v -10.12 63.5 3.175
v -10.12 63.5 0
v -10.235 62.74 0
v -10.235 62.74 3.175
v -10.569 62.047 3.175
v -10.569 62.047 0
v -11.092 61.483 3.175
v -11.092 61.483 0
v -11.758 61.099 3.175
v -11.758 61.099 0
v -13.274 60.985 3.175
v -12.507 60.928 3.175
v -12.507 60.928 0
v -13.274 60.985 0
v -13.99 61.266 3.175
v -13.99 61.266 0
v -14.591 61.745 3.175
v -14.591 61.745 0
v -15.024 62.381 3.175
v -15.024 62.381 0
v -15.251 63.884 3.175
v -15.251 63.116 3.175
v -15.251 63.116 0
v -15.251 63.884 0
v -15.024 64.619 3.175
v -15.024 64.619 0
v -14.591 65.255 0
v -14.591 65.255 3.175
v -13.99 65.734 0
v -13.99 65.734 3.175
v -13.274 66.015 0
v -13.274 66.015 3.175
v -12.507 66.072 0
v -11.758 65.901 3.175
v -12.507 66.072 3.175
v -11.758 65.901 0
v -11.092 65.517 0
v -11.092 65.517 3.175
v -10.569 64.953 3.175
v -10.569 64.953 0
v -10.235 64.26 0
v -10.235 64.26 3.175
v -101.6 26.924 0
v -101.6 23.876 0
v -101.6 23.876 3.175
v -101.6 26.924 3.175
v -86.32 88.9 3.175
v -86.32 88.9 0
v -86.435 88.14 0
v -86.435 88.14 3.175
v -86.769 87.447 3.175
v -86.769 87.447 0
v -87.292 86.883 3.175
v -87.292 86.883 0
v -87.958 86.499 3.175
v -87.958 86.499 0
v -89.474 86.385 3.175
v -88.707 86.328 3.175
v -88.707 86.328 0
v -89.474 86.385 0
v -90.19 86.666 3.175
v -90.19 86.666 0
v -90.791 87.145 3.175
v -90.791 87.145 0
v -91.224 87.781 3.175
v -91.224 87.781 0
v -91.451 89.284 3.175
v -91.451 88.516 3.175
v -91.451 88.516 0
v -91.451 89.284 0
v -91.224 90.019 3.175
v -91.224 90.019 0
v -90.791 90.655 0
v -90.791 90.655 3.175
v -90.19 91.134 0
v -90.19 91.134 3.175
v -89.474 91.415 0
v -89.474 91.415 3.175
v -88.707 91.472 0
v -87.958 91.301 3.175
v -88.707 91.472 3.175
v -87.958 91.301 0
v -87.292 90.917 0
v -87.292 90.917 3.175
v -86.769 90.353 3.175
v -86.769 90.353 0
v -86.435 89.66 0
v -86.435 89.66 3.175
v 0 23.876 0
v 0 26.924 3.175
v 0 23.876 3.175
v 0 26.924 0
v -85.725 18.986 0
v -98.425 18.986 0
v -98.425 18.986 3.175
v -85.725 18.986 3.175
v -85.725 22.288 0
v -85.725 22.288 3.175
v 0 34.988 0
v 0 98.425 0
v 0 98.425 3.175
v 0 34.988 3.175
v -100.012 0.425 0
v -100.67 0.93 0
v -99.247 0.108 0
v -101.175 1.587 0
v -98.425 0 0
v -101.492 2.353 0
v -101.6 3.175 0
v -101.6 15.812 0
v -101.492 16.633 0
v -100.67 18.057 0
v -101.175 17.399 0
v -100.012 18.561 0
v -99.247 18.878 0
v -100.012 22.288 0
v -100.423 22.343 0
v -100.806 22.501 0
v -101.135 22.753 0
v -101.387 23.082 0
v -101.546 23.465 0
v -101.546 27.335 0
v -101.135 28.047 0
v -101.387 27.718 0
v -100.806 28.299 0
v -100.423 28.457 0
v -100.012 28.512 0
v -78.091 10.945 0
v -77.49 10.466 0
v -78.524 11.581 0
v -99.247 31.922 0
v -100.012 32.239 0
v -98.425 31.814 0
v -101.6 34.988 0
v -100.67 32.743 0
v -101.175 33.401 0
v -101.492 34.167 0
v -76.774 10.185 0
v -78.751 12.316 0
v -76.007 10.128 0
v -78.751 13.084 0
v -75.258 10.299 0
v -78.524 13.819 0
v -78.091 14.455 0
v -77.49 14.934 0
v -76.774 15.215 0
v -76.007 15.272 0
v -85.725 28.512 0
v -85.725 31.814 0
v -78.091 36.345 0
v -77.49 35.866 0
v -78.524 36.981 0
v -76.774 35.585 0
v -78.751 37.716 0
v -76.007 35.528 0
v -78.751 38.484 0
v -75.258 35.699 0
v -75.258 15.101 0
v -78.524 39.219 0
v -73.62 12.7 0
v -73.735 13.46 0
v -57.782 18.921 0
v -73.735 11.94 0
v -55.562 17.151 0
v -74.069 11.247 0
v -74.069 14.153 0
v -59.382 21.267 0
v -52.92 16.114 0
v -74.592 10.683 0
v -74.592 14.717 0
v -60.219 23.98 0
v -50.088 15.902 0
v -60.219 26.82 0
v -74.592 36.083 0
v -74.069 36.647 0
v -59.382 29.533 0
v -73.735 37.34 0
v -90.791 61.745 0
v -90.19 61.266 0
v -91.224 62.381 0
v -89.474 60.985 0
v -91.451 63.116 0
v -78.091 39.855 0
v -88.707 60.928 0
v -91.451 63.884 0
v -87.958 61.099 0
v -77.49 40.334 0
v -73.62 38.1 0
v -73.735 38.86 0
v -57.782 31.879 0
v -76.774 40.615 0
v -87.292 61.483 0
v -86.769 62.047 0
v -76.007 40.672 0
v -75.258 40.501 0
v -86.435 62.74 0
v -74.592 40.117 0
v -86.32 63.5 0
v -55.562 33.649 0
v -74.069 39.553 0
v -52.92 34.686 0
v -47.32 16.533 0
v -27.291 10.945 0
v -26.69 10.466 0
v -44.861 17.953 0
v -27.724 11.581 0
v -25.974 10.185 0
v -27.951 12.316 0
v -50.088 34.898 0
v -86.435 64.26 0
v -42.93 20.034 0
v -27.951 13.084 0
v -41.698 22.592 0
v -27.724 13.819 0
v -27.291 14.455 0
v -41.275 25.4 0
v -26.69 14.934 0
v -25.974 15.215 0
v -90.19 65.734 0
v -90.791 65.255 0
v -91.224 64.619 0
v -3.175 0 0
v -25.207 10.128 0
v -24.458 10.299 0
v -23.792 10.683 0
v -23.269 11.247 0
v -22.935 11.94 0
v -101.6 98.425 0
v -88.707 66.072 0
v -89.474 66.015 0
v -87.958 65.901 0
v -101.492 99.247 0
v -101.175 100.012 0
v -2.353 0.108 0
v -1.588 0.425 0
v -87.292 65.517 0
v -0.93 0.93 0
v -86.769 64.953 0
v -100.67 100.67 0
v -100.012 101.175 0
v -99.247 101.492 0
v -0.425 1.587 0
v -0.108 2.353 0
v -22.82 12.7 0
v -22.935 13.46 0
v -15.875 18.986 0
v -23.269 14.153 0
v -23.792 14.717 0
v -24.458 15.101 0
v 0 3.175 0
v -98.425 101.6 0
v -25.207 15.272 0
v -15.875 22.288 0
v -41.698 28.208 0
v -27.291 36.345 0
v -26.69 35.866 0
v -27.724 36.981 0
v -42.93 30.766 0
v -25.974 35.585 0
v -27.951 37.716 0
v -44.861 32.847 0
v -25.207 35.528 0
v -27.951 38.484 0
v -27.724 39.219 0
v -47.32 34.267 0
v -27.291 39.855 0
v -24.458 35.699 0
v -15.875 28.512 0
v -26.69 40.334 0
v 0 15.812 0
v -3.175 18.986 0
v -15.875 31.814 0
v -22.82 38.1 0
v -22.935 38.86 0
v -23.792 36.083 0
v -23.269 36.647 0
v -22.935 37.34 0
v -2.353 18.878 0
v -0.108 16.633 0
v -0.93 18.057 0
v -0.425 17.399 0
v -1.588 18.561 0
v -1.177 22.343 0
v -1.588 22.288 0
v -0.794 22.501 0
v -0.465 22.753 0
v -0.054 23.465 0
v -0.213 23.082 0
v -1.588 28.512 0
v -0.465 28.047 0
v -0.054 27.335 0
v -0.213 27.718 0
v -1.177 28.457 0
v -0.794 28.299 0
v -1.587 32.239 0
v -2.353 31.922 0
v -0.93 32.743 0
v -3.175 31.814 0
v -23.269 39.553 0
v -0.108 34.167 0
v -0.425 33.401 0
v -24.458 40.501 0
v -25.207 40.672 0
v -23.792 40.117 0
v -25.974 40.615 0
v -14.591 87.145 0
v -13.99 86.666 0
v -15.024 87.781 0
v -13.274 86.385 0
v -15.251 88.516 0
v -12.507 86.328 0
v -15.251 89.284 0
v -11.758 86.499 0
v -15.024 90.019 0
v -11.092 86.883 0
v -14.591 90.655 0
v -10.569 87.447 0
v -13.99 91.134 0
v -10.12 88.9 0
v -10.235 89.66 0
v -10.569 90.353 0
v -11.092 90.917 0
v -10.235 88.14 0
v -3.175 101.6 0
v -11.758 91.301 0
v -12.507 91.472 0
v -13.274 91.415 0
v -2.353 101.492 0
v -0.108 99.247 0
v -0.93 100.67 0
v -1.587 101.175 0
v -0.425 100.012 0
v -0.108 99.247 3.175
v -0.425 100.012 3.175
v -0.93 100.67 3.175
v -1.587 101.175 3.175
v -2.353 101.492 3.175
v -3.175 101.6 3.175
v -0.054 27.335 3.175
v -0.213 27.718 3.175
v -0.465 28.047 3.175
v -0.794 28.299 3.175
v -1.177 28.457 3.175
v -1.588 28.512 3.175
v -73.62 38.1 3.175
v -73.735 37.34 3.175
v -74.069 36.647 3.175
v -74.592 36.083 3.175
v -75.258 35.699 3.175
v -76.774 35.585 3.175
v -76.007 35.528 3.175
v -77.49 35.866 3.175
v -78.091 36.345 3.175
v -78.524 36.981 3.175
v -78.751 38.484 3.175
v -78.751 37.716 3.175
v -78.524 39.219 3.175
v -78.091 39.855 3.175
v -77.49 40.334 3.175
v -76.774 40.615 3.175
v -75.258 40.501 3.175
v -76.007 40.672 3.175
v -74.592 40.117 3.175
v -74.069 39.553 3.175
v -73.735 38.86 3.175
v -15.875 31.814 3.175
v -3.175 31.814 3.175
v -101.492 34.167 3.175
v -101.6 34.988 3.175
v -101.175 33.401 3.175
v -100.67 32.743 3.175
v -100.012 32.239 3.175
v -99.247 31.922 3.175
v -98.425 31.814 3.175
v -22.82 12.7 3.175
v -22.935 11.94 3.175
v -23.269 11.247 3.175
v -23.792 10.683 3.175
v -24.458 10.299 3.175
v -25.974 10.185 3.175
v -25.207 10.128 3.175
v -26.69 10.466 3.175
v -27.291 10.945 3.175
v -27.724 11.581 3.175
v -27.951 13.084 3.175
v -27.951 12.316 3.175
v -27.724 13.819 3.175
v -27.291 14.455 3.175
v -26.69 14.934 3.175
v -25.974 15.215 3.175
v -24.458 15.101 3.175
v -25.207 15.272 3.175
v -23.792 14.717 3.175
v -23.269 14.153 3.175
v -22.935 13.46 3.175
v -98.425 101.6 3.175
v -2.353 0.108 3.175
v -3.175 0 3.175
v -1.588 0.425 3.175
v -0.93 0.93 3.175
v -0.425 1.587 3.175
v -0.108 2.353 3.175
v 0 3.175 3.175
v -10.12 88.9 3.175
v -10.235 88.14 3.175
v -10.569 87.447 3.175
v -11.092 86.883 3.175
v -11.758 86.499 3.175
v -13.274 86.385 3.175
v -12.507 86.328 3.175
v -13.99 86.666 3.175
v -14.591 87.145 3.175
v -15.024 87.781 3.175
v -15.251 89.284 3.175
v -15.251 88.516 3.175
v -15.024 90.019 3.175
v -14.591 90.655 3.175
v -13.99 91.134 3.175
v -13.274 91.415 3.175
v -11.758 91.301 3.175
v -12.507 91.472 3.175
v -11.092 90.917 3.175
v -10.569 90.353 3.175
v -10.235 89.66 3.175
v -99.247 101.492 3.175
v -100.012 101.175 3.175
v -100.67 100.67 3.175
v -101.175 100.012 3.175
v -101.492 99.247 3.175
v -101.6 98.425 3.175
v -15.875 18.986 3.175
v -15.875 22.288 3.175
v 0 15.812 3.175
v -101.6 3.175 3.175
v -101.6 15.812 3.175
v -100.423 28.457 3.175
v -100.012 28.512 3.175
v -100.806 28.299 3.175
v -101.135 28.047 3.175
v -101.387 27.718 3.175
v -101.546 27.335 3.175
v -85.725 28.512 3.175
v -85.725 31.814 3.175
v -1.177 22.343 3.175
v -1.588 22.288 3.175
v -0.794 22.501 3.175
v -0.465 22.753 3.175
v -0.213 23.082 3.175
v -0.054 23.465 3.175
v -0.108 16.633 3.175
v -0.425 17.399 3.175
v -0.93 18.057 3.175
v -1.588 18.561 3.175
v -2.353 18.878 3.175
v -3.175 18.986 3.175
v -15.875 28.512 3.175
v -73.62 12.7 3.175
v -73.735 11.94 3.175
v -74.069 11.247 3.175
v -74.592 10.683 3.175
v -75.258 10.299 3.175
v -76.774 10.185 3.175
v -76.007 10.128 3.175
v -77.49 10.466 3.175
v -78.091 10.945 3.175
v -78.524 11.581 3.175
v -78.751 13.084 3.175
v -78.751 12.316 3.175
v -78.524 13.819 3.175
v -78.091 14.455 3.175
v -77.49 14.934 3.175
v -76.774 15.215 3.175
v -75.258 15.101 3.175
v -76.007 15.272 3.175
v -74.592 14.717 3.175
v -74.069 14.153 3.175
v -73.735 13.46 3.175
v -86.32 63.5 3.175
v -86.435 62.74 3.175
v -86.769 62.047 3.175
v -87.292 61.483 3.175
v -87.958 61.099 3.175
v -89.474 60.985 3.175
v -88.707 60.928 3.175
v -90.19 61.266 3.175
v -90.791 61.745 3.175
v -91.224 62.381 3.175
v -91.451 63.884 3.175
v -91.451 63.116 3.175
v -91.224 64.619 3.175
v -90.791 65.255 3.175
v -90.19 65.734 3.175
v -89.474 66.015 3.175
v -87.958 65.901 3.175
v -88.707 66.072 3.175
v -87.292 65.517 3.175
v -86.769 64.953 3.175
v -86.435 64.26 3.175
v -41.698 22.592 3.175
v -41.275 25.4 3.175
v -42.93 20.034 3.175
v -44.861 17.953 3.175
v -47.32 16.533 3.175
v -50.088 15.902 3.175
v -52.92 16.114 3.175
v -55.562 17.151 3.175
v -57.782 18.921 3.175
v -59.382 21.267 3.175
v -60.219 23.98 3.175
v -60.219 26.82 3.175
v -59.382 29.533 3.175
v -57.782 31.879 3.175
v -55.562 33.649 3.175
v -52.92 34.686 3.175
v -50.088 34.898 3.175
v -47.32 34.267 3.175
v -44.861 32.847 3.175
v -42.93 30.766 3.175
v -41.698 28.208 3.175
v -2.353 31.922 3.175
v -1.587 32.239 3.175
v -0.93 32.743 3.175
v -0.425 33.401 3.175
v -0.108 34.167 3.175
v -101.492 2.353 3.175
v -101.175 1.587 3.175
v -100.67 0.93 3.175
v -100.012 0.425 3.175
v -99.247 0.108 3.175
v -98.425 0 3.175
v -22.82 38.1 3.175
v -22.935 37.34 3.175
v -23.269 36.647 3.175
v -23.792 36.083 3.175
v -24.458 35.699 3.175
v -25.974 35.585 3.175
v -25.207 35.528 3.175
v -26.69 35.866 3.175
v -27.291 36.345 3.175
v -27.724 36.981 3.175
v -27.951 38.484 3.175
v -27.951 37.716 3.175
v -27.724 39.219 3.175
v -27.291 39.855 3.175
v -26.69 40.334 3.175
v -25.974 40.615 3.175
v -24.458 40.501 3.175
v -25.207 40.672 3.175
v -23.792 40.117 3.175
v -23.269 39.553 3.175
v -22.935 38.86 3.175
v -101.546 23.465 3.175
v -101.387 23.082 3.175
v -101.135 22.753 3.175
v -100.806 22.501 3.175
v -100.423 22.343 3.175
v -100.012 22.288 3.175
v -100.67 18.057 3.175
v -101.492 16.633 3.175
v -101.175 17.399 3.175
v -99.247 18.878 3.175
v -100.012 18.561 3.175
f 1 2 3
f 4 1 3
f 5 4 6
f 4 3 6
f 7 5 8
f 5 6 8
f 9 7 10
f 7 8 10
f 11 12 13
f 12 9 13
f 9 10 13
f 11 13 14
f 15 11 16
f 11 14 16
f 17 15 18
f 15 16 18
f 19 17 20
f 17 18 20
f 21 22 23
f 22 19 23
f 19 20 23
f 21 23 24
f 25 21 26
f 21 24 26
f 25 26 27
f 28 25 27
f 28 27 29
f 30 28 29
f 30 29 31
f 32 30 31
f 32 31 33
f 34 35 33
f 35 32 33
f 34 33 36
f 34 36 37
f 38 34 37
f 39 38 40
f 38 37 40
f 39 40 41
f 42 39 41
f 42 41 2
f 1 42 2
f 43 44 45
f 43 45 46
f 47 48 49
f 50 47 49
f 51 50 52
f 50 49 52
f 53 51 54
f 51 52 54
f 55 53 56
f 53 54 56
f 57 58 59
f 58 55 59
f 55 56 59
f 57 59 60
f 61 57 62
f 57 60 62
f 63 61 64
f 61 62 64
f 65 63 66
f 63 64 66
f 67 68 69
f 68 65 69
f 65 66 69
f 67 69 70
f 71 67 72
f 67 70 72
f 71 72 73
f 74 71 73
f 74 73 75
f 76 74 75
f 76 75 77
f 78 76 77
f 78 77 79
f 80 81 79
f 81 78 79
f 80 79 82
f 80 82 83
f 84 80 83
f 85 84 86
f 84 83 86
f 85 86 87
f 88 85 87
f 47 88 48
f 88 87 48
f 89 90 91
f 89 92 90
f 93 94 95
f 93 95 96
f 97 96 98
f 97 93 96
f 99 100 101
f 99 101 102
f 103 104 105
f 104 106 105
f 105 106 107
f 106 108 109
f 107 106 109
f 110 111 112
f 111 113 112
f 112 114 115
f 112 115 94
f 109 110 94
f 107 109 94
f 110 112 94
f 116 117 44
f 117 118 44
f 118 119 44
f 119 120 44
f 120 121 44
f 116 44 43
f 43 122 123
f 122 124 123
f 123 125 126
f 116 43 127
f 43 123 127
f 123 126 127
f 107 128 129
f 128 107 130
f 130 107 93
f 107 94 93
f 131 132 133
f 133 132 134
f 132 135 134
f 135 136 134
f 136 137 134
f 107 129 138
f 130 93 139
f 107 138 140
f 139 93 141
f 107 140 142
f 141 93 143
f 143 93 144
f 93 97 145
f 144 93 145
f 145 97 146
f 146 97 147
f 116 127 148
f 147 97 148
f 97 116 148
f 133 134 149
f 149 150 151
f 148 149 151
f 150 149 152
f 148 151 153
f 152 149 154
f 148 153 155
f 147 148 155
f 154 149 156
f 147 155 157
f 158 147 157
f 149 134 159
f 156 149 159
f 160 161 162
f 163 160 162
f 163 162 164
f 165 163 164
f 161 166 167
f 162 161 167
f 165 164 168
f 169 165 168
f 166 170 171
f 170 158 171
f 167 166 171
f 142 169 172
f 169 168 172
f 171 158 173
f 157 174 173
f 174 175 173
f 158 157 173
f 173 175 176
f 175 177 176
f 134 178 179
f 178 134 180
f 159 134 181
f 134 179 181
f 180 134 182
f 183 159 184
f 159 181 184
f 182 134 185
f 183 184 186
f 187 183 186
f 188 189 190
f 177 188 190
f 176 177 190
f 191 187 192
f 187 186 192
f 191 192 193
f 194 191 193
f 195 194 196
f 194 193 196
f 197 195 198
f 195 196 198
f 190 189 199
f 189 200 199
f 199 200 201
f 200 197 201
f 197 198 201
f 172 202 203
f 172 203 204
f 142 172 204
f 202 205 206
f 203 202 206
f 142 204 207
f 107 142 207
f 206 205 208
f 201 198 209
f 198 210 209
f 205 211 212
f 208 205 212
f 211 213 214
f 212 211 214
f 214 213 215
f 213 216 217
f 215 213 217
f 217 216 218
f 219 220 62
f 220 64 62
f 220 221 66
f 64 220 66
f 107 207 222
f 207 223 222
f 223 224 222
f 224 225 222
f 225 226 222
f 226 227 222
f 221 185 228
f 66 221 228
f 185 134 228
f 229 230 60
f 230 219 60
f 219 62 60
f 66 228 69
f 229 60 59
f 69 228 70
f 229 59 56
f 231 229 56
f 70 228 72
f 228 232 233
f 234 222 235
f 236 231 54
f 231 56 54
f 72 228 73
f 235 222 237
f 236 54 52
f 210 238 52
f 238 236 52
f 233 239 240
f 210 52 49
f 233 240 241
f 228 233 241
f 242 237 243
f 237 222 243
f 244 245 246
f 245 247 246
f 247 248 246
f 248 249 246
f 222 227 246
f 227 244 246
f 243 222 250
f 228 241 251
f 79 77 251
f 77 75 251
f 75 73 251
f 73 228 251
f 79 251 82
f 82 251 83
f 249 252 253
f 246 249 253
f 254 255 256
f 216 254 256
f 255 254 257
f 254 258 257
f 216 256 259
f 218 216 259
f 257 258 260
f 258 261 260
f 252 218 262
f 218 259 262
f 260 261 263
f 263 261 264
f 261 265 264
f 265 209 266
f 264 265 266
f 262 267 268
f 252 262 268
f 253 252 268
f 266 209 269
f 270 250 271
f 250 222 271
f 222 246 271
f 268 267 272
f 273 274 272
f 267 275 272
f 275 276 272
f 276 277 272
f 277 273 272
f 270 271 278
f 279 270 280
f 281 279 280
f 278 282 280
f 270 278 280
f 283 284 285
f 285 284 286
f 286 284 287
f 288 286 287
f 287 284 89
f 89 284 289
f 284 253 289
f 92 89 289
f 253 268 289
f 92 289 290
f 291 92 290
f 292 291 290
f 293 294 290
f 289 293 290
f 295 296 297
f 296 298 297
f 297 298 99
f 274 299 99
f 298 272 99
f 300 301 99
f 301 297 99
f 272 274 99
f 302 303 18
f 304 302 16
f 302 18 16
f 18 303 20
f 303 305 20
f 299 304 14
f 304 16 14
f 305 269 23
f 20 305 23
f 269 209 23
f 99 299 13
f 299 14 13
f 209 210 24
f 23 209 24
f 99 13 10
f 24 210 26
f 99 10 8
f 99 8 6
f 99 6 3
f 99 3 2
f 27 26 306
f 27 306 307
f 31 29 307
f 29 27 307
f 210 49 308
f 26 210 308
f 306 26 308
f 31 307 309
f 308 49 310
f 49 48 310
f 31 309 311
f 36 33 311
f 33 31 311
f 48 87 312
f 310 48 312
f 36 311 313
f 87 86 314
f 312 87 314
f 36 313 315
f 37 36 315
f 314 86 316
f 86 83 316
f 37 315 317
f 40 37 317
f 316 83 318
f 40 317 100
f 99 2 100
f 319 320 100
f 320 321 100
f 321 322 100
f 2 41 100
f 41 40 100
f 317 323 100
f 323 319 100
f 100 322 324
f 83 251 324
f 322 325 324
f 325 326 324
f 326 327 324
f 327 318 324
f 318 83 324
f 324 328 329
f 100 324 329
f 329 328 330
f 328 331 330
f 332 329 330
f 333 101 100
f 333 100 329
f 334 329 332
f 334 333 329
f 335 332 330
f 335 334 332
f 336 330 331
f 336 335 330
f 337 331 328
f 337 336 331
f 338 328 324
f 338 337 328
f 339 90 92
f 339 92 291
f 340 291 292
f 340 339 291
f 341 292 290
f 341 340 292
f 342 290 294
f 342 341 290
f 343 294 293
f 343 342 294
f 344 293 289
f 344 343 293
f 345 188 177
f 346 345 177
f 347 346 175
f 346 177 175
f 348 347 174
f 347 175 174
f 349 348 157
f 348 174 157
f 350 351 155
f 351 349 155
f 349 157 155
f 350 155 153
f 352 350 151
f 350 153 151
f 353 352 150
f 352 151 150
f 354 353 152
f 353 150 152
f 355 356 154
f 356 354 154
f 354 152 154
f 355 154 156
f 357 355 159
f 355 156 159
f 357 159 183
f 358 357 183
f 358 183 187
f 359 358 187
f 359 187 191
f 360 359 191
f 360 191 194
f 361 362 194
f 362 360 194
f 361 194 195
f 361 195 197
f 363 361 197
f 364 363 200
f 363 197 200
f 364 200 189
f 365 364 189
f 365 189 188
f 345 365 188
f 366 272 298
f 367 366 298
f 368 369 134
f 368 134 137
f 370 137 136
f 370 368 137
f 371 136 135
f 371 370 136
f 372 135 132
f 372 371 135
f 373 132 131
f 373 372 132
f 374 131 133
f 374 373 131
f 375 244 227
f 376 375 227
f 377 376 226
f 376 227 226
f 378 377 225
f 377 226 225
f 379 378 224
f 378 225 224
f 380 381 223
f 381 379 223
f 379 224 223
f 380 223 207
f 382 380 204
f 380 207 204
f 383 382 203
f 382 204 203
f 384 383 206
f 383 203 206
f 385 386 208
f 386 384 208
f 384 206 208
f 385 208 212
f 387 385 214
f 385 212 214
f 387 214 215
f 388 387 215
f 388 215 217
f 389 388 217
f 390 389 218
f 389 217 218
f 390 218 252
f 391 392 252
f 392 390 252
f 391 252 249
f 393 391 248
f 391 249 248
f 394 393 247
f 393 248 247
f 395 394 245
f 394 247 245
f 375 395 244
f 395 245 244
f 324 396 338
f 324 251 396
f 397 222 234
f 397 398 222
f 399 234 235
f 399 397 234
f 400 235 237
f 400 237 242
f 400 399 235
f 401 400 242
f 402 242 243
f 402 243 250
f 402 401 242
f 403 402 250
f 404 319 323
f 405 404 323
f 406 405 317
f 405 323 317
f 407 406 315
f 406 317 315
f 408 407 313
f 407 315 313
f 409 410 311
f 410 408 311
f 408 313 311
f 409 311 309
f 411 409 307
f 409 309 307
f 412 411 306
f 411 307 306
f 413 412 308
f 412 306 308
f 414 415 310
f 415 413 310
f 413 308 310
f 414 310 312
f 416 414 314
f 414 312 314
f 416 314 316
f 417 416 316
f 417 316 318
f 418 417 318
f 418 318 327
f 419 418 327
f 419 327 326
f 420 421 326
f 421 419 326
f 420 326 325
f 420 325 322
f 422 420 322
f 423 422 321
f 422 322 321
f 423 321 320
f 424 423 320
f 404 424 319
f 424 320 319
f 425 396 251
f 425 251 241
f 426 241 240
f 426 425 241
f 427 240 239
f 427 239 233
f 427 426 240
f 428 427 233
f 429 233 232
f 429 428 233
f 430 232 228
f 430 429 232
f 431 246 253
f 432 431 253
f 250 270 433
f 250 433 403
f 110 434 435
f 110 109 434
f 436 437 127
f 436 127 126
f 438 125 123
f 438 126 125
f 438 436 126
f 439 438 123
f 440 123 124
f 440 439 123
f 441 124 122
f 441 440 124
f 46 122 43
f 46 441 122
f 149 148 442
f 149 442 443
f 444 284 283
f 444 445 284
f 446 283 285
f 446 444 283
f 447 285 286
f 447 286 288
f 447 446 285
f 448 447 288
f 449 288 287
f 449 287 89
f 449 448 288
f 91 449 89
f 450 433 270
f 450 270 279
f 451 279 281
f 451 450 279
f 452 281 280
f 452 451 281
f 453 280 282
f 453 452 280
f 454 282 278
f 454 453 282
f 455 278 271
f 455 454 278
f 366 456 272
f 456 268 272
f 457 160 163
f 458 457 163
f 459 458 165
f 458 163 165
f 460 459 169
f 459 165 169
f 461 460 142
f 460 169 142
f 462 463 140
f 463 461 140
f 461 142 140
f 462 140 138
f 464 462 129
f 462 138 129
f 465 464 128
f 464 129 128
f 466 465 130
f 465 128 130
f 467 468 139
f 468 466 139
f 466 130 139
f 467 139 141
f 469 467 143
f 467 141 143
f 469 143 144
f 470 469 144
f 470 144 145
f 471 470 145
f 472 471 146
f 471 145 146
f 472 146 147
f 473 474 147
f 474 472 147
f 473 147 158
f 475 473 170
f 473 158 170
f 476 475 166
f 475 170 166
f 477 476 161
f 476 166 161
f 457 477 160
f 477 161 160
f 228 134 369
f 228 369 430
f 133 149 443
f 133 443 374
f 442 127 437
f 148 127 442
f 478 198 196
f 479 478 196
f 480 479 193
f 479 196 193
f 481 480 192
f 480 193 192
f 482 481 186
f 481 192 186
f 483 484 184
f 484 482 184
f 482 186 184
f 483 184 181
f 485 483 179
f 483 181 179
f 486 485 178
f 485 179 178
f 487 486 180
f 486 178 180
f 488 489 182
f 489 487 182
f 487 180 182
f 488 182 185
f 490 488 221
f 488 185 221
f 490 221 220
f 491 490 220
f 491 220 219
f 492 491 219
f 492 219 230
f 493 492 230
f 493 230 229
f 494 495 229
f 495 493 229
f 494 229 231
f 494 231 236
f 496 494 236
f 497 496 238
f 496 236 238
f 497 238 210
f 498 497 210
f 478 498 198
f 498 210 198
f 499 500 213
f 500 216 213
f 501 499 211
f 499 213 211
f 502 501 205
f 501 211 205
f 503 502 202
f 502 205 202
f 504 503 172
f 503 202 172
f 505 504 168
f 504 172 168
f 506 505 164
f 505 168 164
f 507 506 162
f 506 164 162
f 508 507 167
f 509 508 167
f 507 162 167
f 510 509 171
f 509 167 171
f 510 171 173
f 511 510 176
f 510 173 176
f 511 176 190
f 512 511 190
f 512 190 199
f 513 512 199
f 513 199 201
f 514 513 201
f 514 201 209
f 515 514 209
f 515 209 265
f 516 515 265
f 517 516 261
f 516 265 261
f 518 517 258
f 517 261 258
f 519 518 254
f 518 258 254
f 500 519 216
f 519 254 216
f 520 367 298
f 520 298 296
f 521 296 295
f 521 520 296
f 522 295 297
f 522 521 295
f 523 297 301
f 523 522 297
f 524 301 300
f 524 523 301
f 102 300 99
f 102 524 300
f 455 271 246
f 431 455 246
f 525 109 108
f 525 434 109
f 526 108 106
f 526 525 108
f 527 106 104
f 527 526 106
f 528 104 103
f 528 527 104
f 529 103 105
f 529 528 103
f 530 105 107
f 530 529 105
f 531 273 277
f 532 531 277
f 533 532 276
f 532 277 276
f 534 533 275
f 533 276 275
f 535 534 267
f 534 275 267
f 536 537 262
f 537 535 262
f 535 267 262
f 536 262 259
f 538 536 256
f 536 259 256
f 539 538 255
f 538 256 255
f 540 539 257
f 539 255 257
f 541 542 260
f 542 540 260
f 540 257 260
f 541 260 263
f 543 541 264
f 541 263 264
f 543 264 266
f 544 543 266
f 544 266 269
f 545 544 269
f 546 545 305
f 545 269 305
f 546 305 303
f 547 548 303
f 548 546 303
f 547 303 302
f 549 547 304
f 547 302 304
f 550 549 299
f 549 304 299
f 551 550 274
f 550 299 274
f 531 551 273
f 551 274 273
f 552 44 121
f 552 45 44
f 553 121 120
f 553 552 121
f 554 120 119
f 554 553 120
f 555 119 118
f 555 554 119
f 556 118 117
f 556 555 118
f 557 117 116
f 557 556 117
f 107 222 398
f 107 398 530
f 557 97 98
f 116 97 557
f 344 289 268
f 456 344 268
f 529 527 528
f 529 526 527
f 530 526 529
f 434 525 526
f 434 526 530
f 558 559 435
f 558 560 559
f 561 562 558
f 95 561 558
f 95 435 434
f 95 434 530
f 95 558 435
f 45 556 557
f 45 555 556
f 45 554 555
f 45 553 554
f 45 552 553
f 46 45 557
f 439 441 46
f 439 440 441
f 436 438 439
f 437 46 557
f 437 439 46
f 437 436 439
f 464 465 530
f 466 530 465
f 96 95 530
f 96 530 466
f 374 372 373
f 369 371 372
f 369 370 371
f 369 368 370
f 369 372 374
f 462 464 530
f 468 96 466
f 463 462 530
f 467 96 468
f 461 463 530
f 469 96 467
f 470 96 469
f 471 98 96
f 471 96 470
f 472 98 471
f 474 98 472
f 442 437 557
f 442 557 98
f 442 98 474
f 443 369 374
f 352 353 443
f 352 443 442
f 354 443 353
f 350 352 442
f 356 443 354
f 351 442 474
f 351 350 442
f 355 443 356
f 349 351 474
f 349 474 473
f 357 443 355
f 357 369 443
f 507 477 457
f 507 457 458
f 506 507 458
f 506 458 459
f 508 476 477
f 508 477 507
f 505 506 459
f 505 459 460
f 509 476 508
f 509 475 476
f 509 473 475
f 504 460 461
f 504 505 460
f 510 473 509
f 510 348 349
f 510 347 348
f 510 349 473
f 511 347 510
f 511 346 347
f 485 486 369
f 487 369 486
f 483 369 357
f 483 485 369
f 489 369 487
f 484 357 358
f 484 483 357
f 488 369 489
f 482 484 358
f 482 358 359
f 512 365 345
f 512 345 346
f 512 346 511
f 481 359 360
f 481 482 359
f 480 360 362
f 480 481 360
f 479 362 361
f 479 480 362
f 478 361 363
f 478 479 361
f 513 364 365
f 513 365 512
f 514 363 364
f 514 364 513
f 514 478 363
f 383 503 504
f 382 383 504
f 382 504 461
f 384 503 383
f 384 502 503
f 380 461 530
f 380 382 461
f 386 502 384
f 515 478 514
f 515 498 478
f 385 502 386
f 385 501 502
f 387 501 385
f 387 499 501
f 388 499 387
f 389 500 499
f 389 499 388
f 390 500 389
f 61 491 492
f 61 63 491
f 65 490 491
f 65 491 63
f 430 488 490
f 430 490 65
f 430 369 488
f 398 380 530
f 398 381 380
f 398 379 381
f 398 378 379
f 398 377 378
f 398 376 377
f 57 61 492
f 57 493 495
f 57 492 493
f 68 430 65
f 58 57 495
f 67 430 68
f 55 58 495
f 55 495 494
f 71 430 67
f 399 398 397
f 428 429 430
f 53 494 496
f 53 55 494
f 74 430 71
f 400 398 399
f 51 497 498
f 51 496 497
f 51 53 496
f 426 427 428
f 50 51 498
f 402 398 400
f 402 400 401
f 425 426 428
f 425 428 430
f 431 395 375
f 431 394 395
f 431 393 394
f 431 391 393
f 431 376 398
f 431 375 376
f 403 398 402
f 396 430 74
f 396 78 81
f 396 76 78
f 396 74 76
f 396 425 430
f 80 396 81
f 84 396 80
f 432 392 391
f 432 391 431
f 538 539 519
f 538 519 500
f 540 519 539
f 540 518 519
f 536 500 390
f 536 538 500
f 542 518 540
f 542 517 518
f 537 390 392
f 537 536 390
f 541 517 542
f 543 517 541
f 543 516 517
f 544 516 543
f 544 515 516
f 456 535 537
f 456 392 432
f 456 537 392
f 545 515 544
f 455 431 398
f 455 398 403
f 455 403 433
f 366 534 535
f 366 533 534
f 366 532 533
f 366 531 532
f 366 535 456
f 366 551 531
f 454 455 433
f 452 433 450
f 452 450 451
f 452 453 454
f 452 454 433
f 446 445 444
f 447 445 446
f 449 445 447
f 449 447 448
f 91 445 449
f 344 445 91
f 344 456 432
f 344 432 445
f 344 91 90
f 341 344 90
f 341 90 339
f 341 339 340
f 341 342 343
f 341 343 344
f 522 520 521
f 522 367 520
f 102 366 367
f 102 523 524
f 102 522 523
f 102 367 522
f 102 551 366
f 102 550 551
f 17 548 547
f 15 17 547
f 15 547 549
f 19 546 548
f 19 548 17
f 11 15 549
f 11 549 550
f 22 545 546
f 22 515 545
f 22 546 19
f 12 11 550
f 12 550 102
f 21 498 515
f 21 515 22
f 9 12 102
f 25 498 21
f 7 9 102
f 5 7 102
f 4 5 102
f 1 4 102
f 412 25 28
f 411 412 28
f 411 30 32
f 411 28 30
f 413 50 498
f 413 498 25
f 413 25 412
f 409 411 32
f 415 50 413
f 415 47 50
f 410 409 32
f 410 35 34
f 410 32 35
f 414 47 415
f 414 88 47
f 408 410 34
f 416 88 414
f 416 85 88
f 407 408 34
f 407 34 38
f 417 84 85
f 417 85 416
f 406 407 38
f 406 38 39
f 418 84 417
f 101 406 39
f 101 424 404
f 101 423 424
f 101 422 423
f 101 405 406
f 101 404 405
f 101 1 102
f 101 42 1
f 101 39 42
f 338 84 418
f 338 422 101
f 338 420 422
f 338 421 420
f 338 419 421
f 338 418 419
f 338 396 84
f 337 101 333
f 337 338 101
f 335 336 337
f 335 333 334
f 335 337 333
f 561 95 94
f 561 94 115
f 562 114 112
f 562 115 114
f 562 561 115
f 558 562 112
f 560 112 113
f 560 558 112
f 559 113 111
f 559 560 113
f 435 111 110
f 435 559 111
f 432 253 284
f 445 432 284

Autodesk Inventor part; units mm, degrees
ref_plane "YZ Plane" through (0, 0, 0) normal (1, 0, 0) x (0, 1, 0)
ref_plane "XZ Plane" through (0, 0, 0) normal (0, 1, 0) x (-1, 0, 0)
ref_plane "XY Plane" through (0, 0, 0) normal (0, 0, 1) x (1, 0, 0)
sketch "Sketch2" plane through (0, 0, 0) normal (0, 0, 1) x (1, 0, 0)
  line L0 (0, 0) -> (-101.6, 0)
  line L1 (-101.6, 0) -> (-101.6, 101.6)
  line L2 (-101.6, 101.6) -> (0, 101.6)
  line L3 (0, 101.6) -> (0, 0)
  circle A0 centre (-12.7, 88.9) radius 2.5797
  circle A1 centre (-50.8, 76.2) radius 9.525
  circle A2 centre (-25.4, 38.1) radius 2.5797
  circle A3 centre (-50.8, 25.4) radius 9.525
  circle A4 centre (-88.9, 88.9) radius 2.5797
  circle A5 centre (-12.7, 63.5) radius 2.5797
  circle A6 centre (-88.9, 63.5) radius 2.5797
  circle A7 centre (-76.2, 38.1) radius 2.5797
  circle A8 centre (-25.4, 12.7) radius 2.5797
  circle A9 centre (-76.2, 12.7) radius 2.5797
  line L4 (-85.725, 19.05) -> (-101.6, 19.05)
  line L5 (-101.6, 19.05) -> (-101.6, 22.225)
  line L6 (-101.6, 22.225) -> (-85.725, 22.225)
  line L7 (-85.725, 22.225) -> (-85.725, 19.05)
  line L8 (-101.6, 22.225) -> (-85.725, 22.225)
  line L9 (-85.725, 22.225) -> (-85.725, 23.8125)
  line L10 (-85.725, 23.8125) -> (-101.6, 23.8125)
  line L11 (-101.6, 23.8125) -> (-101.6, 22.225)
  line L12 (-85.725, 23.8125) -> (-101.6, 23.8125)
  line L13 (-101.6, 23.8125) -> (-101.6, 26.9875)
  line L14 (-101.6, 26.9875) -> (-85.725, 26.9875)
  line L15 (-85.725, 26.9875) -> (-85.725, 23.8125)
  line L16 (-101.6, 26.9875) -> (-85.725, 26.9875)
  line L17 (-85.725, 26.9875) -> (-85.725, 28.575)
  line L18 (-85.725, 28.575) -> (-101.6, 28.575)
  line L19 (-101.6, 28.575) -> (-101.6, 26.9875)
  line L20 (-85.725, 28.575) -> (-101.6, 28.575)
  line L21 (-101.6, 28.575) -> (-101.6, 31.75)
  line L22 (-101.6, 31.75) -> (-85.725, 31.75)
  line L23 (-85.725, 31.75) -> (-85.725, 28.575)
  line L24 (-85.725, 31.8135) -> (-101.6, 31.8135)
  line L25 (-101.6, 31.8135) -> (-101.6, 28.5115)
  line L26 (-101.6, 28.5115) -> (-85.725, 28.5115)
  line L27 (-85.725, 28.5115) -> (-85.725, 31.8135)
  line L28 (-85.725, 27.051) -> (-101.6, 27.051)
  line L29 (-101.6, 27.051) -> (-101.6, 23.749)
  line L30 (-101.6, 23.749) -> (-85.725, 23.749)
  line L31 (-85.725, 23.749) -> (-85.725, 27.051)
  line L32 (-85.725, 22.2885) -> (-101.6, 22.2885)
  line L33 (-101.6, 22.2885) -> (-101.6, 18.9865)
  line L34 (-101.6, 18.9865) -> (-85.725, 18.9865)
  line L35 (-85.725, 18.9865) -> (-85.725, 22.2885)
  line L36 (-101.6, 26.4583) -> (-85.725, 26.4583)
  line L37 (-85.725, 26.4583) -> (-85.725, 24.3417)
  line L38 (-85.725, 24.3417) -> (-101.6, 24.3417)
  line L39 (-101.6, 24.3417) -> (-101.6, 26.4583)
  line L40 (-50.8, 0) -> (-50.8, 101.6)
  line L41 (-15.875, 19.05) -> (0, 19.05)
  line L42 (0, 19.05) -> (0, 22.225)
  line L43 (0, 22.225) -> (-15.875, 22.225)
  line L44 (-15.875, 22.225) -> (-15.875, 19.05)
  line L45 (0, 22.225) -> (-15.875, 22.225)
  line L46 (-15.875, 22.225) -> (-15.875, 23.8125)
  line L47 (-15.875, 23.8125) -> (0, 23.8125)
  line L48 (0, 23.8125) -> (0, 22.225)
  line L49 (-15.875, 23.8125) -> (0, 23.8125)
  line L50 (0, 23.8125) -> (0, 26.9875)
  line L51 (0, 26.9875) -> (-15.875, 26.9875)
  line L52 (-15.875, 26.9875) -> (-15.875, 23.8125)
  line L53 (0, 26.9875) -> (-15.875, 26.9875)
  line L54 (-15.875, 26.9875) -> (-15.875, 28.575)
  line L55 (-15.875, 28.575) -> (0, 28.575)
  line L56 (0, 28.575) -> (0, 26.9875)
  line L57 (-15.875, 28.575) -> (0, 28.575)
  line L58 (0, 28.575) -> (0, 31.75)
  line L59 (0, 31.75) -> (-15.875, 31.75)
  line L60 (-15.875, 31.75) -> (-15.875, 28.575)
  line L61 (-15.875, 31.8135) -> (0, 31.8135)
  line L62 (0, 31.8135) -> (0, 28.5115)
  line L63 (0, 28.5115) -> (-15.875, 28.5115)
  line L64 (-15.875, 28.5115) -> (-15.875, 31.8135)
  line L65 (-15.875, 27.051) -> (0, 27.051)
  line L66 (0, 27.051) -> (0, 23.749)
  line L67 (0, 23.749) -> (-15.875, 23.749)
  line L68 (-15.875, 23.749) -> (-15.875, 27.051)
  line L69 (-15.875, 22.2885) -> (0, 22.2885)
  line L70 (0, 22.2885) -> (0, 18.9865)
  line L71 (0, 18.9865) -> (-15.875, 18.9865)
  line L72 (-15.875, 18.9865) -> (-15.875, 22.2885)
  line L73 (0, 26.4583) -> (-15.875, 26.4583)
  line L74 (-15.875, 26.4583) -> (-15.875, 24.3417)
  line L75 (-15.875, 24.3417) -> (0, 24.3417)
  line L76 (0, 24.3417) -> (0, 26.4583)
  point P0 (-101.6, 30.1625)
  point P1 (-101.6, 20.6375)
  point P2 (-101.6, 25.4)
  point P3 (-85.725, 25.4)
  point P4 (0, 30.1625)
  point P5 (0, 20.6375)
  point P6 (0, 25.4)
  point P7 (-15.875, 25.4)
  point P8 (-50.8, 15.875)
  point P9 (-50.8, 34.925)
  point P10 (-50.8, 66.675)
  point P11 (-50.8, 85.725)
  dimension "d60" = 101.6
  dimension "d61" = 101.6
  dimension "d62" = 19.05
  dimension "d63" = 5.1594
  dimension "d66" = 12.7
  dimension "d69" = 76.2
  dimension "d72" = 25.4
  dimension "d75" = 12.7
  dimension "d76" = 38.1
  dimension "d77" = 12.7
  dimension "d80" = 50.8
  dimension "d83" = 25.4
  dimension "d86" = 25.4
  dimension "d87" = 12.7
  dimension "d88" = 12.7
  dimension "d89" = 25.4
  dimension "d96" = 3.175
  dimension "d97" = 1.5875
  dimension "d98" = 3.302
  dimension "d101" = 2.1167
  dimension "d103" = 15.875
  dimension "d104" = 25.4
extrude "Extrusion2" add sketch "Sketch2" along normal blind 3.175 contours L0 L40 A3 A1 L2 L3 L61 L64 L60 L54 L52 L46 L44 L72 L71 | L0 L1 L34 L35 L7 L9 L15 L17 L23 L27 L24 L2 L40 A1 A3 | L40 A1 | A1 L40 | L69 L46 L67 L3 | L67 L46 L47 L3 | L1 L30 L9 L32 | L47 L52 L75 L3 | L1 L10 L9 L30 | L75 L52 L73 L3 | L1 L38 L15 L10 | L73 L52 L51 L3 | L1 L36 L15 L38 | L51 L54 L65 L3 | L1 L14 L15 L36 | L65 L54 L63 L3 | L1 L28 L17 L14 | L26 L17 L28 L1
fillet "Fillet3" radius 3.175 8 edges at (0, 101.6, 1.5875) (-101.6, 101.6, 1.5875) (0, 18.9865, 1.5875) (0, 31.8135, 1.5875) (0, 0, 1.5875) (-101.6, 0, 1.5875) (-101.6, 18.9865, 1.5875) (-101.6, 31.8135, 1.5875)
fillet "Fillet4" radius 1.5875 4 edges at (0, 22.2885, 1.5875) (0, 28.5115, 1.5875) (-101.6, 22.2885, 1.5875) (-101.6, 28.5115, 1.5875)
properties part number "Dipper Plate (backplate)"
